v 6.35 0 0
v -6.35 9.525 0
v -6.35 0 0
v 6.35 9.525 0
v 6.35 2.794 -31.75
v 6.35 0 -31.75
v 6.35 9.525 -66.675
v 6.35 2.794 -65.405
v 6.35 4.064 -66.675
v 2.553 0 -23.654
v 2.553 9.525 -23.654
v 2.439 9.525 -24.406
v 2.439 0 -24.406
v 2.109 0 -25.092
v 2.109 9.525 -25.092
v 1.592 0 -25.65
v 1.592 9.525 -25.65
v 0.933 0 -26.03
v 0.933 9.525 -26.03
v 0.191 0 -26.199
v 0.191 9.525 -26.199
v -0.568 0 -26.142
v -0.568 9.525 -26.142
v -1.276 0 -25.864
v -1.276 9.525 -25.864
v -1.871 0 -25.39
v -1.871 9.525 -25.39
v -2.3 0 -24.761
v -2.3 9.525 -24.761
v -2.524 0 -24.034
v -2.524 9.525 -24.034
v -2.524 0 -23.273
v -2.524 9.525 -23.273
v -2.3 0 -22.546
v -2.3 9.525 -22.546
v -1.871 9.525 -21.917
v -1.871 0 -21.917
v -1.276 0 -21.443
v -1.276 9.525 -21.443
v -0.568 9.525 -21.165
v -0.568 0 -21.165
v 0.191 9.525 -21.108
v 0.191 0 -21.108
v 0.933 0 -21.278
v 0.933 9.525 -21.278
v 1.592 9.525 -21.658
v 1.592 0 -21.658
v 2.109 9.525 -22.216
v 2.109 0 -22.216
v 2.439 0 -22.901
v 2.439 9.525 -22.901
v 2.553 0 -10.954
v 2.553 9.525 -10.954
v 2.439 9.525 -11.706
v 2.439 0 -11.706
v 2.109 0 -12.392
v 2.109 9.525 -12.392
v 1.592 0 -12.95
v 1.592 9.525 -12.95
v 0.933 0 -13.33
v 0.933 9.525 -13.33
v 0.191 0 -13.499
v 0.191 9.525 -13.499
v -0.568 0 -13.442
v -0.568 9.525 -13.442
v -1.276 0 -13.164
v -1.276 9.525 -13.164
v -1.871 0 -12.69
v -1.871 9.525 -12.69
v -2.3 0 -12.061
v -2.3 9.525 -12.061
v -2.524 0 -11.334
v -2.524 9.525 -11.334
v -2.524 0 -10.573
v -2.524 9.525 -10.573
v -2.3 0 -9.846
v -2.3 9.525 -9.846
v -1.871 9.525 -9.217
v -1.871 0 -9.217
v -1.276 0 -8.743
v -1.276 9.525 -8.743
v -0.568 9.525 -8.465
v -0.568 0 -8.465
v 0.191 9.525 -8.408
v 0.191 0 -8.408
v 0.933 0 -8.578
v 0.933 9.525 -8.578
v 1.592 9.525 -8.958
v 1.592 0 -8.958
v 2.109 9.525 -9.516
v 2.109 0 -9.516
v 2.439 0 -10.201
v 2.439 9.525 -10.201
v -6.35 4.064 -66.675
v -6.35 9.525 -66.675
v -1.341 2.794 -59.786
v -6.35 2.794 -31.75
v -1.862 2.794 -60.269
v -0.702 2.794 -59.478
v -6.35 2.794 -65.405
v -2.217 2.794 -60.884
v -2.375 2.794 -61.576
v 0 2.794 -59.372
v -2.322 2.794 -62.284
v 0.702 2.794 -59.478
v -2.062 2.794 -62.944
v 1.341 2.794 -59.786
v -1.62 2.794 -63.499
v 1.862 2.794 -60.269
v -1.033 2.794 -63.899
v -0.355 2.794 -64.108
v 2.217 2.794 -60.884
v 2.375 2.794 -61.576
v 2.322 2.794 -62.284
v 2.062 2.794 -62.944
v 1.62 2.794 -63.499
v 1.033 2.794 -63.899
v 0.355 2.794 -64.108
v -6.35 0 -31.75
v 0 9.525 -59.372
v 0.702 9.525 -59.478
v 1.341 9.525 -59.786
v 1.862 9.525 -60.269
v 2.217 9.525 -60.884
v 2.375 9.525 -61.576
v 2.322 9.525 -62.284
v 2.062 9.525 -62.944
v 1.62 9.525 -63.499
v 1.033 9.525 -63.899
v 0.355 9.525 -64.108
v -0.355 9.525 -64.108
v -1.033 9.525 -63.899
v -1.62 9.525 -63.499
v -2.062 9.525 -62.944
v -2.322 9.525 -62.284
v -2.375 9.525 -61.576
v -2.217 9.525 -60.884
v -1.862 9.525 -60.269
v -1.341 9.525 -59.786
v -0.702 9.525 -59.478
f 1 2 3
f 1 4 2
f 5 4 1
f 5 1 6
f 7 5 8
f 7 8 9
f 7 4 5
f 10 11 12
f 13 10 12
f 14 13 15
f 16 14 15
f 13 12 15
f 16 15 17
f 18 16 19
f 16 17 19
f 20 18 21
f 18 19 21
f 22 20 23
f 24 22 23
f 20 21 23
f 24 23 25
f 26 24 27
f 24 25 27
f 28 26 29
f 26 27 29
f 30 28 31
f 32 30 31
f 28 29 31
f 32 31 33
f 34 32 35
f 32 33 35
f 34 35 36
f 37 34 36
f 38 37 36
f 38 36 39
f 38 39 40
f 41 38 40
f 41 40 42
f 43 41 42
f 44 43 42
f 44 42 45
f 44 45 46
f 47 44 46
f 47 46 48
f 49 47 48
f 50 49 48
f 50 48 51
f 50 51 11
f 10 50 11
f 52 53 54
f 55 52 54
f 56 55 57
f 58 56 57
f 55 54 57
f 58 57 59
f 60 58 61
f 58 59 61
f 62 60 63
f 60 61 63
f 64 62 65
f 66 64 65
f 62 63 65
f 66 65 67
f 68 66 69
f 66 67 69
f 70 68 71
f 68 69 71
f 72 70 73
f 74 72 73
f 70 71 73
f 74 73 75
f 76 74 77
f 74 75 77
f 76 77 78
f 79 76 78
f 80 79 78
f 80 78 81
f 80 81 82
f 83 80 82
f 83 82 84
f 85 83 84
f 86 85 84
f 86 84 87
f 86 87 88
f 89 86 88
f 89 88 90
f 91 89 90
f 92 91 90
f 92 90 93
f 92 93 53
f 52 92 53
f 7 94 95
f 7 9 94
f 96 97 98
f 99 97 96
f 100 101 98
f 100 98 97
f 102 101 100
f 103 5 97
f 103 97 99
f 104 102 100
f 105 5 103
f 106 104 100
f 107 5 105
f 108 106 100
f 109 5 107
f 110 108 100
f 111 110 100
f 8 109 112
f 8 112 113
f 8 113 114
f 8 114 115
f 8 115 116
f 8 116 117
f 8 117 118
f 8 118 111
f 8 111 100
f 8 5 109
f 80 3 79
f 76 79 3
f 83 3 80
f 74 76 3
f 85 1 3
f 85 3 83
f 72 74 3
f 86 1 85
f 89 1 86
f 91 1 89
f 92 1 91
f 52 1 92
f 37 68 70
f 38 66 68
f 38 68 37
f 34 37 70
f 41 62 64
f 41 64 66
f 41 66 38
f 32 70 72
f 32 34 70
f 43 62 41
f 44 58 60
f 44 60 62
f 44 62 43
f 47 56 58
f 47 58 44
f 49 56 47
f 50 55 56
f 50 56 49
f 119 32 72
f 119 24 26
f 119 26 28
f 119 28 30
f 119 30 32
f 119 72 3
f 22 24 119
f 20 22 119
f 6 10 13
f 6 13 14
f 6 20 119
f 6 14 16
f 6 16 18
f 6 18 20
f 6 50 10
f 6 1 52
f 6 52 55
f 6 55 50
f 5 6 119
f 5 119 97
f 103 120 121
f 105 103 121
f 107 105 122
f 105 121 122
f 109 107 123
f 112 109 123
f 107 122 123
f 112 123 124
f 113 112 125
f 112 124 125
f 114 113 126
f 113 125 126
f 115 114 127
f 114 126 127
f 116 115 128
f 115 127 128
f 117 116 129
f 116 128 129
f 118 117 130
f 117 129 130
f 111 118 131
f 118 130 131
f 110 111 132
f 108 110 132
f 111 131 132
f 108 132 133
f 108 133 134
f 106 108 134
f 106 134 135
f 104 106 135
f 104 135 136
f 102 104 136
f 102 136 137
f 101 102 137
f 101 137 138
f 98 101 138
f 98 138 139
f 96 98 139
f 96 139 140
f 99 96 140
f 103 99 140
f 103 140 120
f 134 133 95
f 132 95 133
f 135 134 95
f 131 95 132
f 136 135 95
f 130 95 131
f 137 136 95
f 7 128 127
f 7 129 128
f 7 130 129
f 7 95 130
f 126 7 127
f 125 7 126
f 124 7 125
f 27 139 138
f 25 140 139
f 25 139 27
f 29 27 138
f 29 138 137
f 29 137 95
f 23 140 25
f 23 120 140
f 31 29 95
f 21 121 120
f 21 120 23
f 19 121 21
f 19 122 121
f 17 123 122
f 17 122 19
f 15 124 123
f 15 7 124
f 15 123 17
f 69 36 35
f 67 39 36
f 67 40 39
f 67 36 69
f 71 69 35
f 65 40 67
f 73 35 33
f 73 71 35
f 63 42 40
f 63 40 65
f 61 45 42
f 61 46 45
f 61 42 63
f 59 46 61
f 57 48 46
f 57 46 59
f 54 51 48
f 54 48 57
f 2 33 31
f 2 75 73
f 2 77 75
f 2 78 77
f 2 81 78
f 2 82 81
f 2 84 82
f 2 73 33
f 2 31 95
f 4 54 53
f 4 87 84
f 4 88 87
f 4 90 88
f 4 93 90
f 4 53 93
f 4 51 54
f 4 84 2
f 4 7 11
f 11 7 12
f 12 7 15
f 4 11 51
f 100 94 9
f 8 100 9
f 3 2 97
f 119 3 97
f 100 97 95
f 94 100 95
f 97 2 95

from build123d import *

# Parameters (mm, degrees)
BOSS_EXTRUDE1_DEPTH    = 6.35
F_10_CLEARANCE_HOLE1_D = 5.1054
CUT_EXTRUDE1_REACH     = 69.651
SKETCH4_R              = 2.38125
CHAMFER1_SIZE          = 1.27


with BuildPart() as part:
    # Sketch1 → Boss-Extrude1 (new, symmetric)
    with BuildSketch(Plane(origin=(0, 0, 0), x_dir=(0, 0, -1), z_dir=(1, 0, 0))):
        Polygon((0, 0), (31.75, 0), (31.75, 2.794), (66.675, 2.794), (66.675, 9.525), (0, 9.525), align=None)
    extrude(amount=BOSS_EXTRUDE1_DEPTH, both=True)

    # #10 Clearance Hole1 (through all)
    with Locations(Plane(origin=(0, 0, 0), x_dir=(-1, 0, 0), z_dir=(0, -1, 0))):
        with Locations((0, 23.65375), (0, 10.95375)):
            Hole(F_10_CLEARANCE_HOLE1_D / 2)

    # Sketch4 → Cut-Extrude1 (cut, up to next)
    with BuildSketch(Plane(origin=(0, 9.525, 0), x_dir=(1, 0, 0), z_dir=(0, 1, 0)), mode=Mode.PRIVATE) as cut_extrude1_sk1:
        with Locations(Location((0, 61.75375, 0), (0, 0, 270))):
            Circle(SKETCH4_R)
    cut_extrude1_tool1 = extrude(cut_extrude1_sk1.sketch, amount=-CUT_EXTRUDE1_REACH, mode=Mode.PRIVATE) & part.part
    add(cut_extrude1_tool1.solids().sort_by_distance((0, 9.525, -61.75375))[0], mode=Mode.SUBTRACT)

    # Chamfer1
    chamfer1_edges = [part.edges().sort_by_distance(p)[0] for p in [
        (0, 2.794, -66.675),
    ]]
    chamfer(chamfer1_edges, length=CHAMFER1_SIZE)


solid = part.part
